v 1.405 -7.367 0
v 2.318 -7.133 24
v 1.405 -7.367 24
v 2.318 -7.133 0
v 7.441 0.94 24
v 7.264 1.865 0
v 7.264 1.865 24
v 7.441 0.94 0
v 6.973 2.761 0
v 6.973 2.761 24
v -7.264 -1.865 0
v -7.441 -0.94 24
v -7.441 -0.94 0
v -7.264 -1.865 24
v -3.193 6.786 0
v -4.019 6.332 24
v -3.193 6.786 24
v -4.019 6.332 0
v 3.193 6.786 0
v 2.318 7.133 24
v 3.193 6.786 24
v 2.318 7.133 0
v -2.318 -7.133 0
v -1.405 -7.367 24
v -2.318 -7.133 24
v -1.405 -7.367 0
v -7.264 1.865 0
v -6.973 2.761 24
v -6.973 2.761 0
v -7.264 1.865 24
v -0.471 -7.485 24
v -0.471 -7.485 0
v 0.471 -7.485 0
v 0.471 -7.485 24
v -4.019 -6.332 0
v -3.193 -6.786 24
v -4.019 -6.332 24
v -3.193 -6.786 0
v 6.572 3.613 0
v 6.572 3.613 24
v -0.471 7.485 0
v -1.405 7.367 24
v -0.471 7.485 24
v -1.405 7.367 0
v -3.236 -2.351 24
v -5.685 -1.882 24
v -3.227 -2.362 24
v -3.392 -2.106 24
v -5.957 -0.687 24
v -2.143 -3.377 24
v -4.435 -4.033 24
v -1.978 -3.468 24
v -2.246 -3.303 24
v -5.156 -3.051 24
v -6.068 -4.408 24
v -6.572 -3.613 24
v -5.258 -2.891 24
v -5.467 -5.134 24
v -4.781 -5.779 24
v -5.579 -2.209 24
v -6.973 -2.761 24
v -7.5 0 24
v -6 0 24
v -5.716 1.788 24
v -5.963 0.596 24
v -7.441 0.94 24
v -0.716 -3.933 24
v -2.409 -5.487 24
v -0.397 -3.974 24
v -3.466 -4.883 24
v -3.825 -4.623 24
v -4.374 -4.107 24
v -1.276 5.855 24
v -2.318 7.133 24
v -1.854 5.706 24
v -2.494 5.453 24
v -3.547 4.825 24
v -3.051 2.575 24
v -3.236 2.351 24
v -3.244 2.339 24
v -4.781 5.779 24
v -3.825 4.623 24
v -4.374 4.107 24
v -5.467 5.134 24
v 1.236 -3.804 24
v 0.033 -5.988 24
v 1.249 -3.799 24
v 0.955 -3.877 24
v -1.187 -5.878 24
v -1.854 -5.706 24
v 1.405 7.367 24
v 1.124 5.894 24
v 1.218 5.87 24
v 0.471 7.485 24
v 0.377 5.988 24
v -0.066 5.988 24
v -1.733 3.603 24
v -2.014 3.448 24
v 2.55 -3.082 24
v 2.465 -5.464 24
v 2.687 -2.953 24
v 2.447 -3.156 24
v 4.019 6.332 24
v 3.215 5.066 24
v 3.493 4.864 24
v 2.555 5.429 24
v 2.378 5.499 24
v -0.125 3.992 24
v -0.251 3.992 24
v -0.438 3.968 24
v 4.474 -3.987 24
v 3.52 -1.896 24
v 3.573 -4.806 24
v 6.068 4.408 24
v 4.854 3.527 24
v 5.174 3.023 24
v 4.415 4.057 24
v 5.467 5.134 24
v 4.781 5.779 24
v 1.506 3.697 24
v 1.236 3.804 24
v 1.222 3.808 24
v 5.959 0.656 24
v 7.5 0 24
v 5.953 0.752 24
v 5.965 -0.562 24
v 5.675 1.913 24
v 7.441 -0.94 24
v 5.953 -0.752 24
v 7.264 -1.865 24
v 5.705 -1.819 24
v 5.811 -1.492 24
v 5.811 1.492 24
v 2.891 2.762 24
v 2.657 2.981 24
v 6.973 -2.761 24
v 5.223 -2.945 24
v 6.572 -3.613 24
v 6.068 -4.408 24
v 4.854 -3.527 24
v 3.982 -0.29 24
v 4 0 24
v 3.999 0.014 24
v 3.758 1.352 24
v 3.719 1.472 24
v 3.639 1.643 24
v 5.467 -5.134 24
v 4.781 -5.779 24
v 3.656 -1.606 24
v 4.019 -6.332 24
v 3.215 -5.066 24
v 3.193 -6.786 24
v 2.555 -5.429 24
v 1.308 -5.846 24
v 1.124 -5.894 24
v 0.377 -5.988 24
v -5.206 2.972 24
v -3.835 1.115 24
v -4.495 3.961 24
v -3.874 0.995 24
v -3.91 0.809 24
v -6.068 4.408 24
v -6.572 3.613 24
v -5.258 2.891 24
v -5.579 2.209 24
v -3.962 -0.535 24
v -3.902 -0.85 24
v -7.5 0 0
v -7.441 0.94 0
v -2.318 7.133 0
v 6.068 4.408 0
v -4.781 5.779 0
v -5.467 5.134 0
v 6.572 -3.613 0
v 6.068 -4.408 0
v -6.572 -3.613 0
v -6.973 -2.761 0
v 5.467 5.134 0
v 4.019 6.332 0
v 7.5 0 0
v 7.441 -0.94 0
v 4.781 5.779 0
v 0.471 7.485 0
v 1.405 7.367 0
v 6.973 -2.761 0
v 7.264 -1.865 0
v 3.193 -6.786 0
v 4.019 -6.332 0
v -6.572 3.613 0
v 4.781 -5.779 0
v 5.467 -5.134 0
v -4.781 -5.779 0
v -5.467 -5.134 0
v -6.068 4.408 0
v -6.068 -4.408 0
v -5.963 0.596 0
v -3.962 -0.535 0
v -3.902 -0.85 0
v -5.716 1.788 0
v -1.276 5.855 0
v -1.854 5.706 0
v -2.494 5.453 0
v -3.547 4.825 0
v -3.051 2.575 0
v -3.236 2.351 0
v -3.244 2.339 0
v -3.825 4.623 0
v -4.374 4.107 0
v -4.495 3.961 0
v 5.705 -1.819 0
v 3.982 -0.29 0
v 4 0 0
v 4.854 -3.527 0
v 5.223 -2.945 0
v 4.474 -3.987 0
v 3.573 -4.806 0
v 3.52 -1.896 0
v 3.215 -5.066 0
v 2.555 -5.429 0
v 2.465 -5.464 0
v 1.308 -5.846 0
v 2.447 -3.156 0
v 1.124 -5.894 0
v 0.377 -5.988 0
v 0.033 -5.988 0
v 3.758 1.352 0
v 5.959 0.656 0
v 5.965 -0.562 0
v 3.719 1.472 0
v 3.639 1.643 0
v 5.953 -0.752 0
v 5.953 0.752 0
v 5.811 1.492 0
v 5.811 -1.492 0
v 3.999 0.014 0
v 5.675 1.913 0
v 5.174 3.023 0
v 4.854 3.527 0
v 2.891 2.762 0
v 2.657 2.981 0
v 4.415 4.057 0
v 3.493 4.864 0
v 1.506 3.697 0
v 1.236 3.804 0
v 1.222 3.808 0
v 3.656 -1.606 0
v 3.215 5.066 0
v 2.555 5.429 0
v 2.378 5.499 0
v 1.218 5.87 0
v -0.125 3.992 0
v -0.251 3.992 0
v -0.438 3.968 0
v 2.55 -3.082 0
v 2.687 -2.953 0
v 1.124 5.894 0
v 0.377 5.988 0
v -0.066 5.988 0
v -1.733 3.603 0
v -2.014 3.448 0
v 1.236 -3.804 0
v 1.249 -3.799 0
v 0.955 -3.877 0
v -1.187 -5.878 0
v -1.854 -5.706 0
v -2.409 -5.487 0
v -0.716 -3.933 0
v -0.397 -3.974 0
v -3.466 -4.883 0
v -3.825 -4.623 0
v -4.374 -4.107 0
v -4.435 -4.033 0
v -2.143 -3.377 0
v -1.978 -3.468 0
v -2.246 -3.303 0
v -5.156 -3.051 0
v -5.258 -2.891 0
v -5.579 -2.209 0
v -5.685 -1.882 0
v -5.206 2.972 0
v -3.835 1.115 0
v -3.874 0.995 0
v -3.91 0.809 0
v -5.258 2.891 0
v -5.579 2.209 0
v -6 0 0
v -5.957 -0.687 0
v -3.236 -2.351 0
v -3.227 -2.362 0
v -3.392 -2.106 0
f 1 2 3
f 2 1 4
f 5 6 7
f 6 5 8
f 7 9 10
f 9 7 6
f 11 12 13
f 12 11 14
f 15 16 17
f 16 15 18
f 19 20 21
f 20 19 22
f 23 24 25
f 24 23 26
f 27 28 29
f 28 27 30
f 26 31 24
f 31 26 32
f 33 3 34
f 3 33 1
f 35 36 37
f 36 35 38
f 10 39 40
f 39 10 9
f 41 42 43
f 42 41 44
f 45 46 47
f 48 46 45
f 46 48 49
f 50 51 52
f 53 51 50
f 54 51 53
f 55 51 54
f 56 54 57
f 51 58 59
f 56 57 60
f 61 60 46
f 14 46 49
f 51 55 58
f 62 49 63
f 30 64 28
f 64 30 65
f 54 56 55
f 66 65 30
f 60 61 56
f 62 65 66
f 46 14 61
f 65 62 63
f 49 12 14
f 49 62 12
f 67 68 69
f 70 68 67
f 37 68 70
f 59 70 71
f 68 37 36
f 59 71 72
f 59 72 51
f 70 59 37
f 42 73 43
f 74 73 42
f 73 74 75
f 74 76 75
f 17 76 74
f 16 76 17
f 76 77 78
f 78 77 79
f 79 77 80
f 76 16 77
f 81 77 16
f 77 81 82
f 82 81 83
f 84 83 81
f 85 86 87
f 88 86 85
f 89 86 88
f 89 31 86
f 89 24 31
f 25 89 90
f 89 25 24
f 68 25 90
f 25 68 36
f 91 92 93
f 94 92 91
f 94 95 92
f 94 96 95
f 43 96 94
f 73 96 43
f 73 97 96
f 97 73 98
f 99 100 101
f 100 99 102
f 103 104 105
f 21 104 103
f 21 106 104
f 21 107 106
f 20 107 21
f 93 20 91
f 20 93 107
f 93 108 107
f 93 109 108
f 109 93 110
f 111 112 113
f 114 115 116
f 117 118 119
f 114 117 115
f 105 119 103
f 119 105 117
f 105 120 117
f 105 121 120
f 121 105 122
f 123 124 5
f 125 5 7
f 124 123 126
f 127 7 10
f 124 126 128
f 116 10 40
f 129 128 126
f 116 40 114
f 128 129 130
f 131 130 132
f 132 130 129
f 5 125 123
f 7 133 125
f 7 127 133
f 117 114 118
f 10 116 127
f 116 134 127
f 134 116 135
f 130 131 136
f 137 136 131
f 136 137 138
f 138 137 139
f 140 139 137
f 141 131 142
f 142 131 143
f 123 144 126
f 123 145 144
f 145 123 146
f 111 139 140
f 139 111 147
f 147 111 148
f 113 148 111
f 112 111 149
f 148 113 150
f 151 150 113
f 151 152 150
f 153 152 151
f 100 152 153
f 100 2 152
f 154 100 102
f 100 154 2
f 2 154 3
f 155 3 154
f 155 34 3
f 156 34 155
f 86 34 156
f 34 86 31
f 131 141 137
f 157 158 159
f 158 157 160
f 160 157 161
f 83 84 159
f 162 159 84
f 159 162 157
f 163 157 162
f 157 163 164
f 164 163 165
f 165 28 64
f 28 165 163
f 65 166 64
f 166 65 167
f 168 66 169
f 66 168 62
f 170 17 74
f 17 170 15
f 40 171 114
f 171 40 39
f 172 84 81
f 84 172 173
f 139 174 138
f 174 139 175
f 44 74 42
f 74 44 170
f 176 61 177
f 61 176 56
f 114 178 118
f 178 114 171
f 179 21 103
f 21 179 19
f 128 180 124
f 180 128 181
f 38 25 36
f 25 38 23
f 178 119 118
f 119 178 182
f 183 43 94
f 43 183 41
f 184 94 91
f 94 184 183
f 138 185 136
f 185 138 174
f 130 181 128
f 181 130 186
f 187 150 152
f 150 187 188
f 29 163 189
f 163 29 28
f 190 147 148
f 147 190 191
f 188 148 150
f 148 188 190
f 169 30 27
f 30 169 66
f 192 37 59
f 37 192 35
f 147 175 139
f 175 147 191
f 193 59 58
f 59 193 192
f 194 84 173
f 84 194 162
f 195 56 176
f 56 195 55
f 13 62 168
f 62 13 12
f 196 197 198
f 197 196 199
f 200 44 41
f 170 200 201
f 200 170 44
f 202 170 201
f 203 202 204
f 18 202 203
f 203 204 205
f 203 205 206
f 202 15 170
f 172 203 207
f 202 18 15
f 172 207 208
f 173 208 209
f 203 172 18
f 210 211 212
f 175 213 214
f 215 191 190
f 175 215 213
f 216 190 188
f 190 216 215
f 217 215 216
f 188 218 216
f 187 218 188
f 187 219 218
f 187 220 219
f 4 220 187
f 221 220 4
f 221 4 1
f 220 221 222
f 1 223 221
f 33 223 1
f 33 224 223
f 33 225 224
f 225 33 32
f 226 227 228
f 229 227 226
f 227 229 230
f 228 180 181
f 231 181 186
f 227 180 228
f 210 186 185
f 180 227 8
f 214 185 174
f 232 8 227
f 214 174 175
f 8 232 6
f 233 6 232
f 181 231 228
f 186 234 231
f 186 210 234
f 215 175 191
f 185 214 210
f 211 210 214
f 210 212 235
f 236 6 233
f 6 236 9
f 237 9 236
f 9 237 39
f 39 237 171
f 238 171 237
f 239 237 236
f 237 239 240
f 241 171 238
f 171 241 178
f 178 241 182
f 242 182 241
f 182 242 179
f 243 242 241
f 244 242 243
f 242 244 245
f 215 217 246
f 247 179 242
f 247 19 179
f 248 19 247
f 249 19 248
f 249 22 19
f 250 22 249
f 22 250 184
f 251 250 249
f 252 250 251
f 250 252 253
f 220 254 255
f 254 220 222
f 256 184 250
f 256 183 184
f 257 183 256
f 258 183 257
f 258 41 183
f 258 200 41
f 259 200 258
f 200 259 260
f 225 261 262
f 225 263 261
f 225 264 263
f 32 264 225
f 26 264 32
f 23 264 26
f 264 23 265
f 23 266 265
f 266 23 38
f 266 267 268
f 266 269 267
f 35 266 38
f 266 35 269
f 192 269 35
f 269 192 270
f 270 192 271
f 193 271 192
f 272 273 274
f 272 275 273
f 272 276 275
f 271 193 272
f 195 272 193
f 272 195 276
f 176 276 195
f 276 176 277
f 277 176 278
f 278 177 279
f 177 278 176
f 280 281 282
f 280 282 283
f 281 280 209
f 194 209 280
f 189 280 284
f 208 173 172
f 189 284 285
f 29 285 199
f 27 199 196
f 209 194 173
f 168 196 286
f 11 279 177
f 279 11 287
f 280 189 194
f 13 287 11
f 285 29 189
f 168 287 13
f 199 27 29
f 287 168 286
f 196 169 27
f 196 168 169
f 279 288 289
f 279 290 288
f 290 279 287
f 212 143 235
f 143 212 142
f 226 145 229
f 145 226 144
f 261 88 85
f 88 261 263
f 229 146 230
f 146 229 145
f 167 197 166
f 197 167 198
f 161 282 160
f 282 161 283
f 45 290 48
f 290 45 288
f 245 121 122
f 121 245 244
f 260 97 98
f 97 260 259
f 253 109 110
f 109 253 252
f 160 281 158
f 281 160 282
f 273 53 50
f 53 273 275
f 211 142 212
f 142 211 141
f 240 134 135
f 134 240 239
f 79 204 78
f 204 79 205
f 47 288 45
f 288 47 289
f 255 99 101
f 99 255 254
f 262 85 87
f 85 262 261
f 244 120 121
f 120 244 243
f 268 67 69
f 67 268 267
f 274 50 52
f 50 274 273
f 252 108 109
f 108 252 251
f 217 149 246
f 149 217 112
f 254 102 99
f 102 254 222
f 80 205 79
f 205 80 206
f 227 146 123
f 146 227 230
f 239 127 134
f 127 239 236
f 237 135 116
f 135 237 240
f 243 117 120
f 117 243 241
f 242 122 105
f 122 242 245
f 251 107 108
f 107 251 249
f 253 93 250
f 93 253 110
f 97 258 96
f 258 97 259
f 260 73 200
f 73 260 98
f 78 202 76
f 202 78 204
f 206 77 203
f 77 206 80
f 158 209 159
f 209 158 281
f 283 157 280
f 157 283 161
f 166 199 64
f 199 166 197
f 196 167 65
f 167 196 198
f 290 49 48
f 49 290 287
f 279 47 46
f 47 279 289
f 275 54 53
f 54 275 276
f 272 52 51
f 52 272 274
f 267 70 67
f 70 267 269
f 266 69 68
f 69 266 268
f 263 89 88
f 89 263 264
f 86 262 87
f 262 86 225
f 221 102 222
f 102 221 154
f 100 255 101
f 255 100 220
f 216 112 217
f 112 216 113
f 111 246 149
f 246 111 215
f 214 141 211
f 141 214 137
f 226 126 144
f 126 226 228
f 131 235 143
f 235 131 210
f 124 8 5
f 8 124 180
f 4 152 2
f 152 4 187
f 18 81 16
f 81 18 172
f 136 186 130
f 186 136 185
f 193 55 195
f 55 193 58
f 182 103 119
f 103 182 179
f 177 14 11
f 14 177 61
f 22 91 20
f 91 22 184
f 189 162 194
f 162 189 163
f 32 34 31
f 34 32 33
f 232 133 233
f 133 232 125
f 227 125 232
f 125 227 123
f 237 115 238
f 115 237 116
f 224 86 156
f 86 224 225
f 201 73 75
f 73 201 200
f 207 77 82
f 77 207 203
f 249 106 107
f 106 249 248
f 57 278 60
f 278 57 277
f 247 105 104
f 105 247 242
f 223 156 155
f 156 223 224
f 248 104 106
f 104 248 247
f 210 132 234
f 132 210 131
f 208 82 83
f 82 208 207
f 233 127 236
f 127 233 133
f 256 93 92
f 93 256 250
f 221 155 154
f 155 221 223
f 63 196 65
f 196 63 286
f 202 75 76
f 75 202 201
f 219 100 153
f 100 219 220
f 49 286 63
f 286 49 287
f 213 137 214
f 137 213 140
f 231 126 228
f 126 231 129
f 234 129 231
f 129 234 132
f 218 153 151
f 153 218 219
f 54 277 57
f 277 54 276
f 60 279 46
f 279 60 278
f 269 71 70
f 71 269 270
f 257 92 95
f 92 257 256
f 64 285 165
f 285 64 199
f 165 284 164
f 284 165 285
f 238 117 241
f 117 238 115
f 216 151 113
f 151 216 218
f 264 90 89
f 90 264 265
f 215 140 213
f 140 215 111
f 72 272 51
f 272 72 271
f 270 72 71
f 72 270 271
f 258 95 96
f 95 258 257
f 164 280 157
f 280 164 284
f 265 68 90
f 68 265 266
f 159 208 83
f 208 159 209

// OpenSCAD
// linear bearing ... Glyn Cowles Dec 2018
// External diameter
exDiam=15;
// Internal diameter
inDiam=8;
// Length
length=24;
// Shell thickness
th=3; 
// size of inner spline gap
gap0=0.5;
// size of outer spline gap 
gap1=1.3;
// number splines
n=15; 
// angle of splines
angle=70; 
// resolution 
$fn=50;

//-----------------------------------------------------------
difference() {
    d=(exDiam)/2;
    tube(inDiam,exDiam,length);
    for (r=[0:360/n:360]) {
        rotate([0,0,r]) translate([d,0,0]) wedge();
        }
    }
tube(exDiam-th,exDiam,length);
//-----------------------------------------------------------
module tube(di,do,h) {
difference() {
cylinder(h=h,d=do);
cylinder(h=h,d=di);
}
}
//-----------------------------------------------------------
module wedge(){
    points=[[0,0],[(gap1-gap0)/2,exDiam/2],[gap1-(gap1-gap0)/2,exDiam/2],[gap1,0],[0,0]];
    linear_extrude(length) rotate([0,0,angle]) polygon(points);
}
//-----------------------------------------------------------
